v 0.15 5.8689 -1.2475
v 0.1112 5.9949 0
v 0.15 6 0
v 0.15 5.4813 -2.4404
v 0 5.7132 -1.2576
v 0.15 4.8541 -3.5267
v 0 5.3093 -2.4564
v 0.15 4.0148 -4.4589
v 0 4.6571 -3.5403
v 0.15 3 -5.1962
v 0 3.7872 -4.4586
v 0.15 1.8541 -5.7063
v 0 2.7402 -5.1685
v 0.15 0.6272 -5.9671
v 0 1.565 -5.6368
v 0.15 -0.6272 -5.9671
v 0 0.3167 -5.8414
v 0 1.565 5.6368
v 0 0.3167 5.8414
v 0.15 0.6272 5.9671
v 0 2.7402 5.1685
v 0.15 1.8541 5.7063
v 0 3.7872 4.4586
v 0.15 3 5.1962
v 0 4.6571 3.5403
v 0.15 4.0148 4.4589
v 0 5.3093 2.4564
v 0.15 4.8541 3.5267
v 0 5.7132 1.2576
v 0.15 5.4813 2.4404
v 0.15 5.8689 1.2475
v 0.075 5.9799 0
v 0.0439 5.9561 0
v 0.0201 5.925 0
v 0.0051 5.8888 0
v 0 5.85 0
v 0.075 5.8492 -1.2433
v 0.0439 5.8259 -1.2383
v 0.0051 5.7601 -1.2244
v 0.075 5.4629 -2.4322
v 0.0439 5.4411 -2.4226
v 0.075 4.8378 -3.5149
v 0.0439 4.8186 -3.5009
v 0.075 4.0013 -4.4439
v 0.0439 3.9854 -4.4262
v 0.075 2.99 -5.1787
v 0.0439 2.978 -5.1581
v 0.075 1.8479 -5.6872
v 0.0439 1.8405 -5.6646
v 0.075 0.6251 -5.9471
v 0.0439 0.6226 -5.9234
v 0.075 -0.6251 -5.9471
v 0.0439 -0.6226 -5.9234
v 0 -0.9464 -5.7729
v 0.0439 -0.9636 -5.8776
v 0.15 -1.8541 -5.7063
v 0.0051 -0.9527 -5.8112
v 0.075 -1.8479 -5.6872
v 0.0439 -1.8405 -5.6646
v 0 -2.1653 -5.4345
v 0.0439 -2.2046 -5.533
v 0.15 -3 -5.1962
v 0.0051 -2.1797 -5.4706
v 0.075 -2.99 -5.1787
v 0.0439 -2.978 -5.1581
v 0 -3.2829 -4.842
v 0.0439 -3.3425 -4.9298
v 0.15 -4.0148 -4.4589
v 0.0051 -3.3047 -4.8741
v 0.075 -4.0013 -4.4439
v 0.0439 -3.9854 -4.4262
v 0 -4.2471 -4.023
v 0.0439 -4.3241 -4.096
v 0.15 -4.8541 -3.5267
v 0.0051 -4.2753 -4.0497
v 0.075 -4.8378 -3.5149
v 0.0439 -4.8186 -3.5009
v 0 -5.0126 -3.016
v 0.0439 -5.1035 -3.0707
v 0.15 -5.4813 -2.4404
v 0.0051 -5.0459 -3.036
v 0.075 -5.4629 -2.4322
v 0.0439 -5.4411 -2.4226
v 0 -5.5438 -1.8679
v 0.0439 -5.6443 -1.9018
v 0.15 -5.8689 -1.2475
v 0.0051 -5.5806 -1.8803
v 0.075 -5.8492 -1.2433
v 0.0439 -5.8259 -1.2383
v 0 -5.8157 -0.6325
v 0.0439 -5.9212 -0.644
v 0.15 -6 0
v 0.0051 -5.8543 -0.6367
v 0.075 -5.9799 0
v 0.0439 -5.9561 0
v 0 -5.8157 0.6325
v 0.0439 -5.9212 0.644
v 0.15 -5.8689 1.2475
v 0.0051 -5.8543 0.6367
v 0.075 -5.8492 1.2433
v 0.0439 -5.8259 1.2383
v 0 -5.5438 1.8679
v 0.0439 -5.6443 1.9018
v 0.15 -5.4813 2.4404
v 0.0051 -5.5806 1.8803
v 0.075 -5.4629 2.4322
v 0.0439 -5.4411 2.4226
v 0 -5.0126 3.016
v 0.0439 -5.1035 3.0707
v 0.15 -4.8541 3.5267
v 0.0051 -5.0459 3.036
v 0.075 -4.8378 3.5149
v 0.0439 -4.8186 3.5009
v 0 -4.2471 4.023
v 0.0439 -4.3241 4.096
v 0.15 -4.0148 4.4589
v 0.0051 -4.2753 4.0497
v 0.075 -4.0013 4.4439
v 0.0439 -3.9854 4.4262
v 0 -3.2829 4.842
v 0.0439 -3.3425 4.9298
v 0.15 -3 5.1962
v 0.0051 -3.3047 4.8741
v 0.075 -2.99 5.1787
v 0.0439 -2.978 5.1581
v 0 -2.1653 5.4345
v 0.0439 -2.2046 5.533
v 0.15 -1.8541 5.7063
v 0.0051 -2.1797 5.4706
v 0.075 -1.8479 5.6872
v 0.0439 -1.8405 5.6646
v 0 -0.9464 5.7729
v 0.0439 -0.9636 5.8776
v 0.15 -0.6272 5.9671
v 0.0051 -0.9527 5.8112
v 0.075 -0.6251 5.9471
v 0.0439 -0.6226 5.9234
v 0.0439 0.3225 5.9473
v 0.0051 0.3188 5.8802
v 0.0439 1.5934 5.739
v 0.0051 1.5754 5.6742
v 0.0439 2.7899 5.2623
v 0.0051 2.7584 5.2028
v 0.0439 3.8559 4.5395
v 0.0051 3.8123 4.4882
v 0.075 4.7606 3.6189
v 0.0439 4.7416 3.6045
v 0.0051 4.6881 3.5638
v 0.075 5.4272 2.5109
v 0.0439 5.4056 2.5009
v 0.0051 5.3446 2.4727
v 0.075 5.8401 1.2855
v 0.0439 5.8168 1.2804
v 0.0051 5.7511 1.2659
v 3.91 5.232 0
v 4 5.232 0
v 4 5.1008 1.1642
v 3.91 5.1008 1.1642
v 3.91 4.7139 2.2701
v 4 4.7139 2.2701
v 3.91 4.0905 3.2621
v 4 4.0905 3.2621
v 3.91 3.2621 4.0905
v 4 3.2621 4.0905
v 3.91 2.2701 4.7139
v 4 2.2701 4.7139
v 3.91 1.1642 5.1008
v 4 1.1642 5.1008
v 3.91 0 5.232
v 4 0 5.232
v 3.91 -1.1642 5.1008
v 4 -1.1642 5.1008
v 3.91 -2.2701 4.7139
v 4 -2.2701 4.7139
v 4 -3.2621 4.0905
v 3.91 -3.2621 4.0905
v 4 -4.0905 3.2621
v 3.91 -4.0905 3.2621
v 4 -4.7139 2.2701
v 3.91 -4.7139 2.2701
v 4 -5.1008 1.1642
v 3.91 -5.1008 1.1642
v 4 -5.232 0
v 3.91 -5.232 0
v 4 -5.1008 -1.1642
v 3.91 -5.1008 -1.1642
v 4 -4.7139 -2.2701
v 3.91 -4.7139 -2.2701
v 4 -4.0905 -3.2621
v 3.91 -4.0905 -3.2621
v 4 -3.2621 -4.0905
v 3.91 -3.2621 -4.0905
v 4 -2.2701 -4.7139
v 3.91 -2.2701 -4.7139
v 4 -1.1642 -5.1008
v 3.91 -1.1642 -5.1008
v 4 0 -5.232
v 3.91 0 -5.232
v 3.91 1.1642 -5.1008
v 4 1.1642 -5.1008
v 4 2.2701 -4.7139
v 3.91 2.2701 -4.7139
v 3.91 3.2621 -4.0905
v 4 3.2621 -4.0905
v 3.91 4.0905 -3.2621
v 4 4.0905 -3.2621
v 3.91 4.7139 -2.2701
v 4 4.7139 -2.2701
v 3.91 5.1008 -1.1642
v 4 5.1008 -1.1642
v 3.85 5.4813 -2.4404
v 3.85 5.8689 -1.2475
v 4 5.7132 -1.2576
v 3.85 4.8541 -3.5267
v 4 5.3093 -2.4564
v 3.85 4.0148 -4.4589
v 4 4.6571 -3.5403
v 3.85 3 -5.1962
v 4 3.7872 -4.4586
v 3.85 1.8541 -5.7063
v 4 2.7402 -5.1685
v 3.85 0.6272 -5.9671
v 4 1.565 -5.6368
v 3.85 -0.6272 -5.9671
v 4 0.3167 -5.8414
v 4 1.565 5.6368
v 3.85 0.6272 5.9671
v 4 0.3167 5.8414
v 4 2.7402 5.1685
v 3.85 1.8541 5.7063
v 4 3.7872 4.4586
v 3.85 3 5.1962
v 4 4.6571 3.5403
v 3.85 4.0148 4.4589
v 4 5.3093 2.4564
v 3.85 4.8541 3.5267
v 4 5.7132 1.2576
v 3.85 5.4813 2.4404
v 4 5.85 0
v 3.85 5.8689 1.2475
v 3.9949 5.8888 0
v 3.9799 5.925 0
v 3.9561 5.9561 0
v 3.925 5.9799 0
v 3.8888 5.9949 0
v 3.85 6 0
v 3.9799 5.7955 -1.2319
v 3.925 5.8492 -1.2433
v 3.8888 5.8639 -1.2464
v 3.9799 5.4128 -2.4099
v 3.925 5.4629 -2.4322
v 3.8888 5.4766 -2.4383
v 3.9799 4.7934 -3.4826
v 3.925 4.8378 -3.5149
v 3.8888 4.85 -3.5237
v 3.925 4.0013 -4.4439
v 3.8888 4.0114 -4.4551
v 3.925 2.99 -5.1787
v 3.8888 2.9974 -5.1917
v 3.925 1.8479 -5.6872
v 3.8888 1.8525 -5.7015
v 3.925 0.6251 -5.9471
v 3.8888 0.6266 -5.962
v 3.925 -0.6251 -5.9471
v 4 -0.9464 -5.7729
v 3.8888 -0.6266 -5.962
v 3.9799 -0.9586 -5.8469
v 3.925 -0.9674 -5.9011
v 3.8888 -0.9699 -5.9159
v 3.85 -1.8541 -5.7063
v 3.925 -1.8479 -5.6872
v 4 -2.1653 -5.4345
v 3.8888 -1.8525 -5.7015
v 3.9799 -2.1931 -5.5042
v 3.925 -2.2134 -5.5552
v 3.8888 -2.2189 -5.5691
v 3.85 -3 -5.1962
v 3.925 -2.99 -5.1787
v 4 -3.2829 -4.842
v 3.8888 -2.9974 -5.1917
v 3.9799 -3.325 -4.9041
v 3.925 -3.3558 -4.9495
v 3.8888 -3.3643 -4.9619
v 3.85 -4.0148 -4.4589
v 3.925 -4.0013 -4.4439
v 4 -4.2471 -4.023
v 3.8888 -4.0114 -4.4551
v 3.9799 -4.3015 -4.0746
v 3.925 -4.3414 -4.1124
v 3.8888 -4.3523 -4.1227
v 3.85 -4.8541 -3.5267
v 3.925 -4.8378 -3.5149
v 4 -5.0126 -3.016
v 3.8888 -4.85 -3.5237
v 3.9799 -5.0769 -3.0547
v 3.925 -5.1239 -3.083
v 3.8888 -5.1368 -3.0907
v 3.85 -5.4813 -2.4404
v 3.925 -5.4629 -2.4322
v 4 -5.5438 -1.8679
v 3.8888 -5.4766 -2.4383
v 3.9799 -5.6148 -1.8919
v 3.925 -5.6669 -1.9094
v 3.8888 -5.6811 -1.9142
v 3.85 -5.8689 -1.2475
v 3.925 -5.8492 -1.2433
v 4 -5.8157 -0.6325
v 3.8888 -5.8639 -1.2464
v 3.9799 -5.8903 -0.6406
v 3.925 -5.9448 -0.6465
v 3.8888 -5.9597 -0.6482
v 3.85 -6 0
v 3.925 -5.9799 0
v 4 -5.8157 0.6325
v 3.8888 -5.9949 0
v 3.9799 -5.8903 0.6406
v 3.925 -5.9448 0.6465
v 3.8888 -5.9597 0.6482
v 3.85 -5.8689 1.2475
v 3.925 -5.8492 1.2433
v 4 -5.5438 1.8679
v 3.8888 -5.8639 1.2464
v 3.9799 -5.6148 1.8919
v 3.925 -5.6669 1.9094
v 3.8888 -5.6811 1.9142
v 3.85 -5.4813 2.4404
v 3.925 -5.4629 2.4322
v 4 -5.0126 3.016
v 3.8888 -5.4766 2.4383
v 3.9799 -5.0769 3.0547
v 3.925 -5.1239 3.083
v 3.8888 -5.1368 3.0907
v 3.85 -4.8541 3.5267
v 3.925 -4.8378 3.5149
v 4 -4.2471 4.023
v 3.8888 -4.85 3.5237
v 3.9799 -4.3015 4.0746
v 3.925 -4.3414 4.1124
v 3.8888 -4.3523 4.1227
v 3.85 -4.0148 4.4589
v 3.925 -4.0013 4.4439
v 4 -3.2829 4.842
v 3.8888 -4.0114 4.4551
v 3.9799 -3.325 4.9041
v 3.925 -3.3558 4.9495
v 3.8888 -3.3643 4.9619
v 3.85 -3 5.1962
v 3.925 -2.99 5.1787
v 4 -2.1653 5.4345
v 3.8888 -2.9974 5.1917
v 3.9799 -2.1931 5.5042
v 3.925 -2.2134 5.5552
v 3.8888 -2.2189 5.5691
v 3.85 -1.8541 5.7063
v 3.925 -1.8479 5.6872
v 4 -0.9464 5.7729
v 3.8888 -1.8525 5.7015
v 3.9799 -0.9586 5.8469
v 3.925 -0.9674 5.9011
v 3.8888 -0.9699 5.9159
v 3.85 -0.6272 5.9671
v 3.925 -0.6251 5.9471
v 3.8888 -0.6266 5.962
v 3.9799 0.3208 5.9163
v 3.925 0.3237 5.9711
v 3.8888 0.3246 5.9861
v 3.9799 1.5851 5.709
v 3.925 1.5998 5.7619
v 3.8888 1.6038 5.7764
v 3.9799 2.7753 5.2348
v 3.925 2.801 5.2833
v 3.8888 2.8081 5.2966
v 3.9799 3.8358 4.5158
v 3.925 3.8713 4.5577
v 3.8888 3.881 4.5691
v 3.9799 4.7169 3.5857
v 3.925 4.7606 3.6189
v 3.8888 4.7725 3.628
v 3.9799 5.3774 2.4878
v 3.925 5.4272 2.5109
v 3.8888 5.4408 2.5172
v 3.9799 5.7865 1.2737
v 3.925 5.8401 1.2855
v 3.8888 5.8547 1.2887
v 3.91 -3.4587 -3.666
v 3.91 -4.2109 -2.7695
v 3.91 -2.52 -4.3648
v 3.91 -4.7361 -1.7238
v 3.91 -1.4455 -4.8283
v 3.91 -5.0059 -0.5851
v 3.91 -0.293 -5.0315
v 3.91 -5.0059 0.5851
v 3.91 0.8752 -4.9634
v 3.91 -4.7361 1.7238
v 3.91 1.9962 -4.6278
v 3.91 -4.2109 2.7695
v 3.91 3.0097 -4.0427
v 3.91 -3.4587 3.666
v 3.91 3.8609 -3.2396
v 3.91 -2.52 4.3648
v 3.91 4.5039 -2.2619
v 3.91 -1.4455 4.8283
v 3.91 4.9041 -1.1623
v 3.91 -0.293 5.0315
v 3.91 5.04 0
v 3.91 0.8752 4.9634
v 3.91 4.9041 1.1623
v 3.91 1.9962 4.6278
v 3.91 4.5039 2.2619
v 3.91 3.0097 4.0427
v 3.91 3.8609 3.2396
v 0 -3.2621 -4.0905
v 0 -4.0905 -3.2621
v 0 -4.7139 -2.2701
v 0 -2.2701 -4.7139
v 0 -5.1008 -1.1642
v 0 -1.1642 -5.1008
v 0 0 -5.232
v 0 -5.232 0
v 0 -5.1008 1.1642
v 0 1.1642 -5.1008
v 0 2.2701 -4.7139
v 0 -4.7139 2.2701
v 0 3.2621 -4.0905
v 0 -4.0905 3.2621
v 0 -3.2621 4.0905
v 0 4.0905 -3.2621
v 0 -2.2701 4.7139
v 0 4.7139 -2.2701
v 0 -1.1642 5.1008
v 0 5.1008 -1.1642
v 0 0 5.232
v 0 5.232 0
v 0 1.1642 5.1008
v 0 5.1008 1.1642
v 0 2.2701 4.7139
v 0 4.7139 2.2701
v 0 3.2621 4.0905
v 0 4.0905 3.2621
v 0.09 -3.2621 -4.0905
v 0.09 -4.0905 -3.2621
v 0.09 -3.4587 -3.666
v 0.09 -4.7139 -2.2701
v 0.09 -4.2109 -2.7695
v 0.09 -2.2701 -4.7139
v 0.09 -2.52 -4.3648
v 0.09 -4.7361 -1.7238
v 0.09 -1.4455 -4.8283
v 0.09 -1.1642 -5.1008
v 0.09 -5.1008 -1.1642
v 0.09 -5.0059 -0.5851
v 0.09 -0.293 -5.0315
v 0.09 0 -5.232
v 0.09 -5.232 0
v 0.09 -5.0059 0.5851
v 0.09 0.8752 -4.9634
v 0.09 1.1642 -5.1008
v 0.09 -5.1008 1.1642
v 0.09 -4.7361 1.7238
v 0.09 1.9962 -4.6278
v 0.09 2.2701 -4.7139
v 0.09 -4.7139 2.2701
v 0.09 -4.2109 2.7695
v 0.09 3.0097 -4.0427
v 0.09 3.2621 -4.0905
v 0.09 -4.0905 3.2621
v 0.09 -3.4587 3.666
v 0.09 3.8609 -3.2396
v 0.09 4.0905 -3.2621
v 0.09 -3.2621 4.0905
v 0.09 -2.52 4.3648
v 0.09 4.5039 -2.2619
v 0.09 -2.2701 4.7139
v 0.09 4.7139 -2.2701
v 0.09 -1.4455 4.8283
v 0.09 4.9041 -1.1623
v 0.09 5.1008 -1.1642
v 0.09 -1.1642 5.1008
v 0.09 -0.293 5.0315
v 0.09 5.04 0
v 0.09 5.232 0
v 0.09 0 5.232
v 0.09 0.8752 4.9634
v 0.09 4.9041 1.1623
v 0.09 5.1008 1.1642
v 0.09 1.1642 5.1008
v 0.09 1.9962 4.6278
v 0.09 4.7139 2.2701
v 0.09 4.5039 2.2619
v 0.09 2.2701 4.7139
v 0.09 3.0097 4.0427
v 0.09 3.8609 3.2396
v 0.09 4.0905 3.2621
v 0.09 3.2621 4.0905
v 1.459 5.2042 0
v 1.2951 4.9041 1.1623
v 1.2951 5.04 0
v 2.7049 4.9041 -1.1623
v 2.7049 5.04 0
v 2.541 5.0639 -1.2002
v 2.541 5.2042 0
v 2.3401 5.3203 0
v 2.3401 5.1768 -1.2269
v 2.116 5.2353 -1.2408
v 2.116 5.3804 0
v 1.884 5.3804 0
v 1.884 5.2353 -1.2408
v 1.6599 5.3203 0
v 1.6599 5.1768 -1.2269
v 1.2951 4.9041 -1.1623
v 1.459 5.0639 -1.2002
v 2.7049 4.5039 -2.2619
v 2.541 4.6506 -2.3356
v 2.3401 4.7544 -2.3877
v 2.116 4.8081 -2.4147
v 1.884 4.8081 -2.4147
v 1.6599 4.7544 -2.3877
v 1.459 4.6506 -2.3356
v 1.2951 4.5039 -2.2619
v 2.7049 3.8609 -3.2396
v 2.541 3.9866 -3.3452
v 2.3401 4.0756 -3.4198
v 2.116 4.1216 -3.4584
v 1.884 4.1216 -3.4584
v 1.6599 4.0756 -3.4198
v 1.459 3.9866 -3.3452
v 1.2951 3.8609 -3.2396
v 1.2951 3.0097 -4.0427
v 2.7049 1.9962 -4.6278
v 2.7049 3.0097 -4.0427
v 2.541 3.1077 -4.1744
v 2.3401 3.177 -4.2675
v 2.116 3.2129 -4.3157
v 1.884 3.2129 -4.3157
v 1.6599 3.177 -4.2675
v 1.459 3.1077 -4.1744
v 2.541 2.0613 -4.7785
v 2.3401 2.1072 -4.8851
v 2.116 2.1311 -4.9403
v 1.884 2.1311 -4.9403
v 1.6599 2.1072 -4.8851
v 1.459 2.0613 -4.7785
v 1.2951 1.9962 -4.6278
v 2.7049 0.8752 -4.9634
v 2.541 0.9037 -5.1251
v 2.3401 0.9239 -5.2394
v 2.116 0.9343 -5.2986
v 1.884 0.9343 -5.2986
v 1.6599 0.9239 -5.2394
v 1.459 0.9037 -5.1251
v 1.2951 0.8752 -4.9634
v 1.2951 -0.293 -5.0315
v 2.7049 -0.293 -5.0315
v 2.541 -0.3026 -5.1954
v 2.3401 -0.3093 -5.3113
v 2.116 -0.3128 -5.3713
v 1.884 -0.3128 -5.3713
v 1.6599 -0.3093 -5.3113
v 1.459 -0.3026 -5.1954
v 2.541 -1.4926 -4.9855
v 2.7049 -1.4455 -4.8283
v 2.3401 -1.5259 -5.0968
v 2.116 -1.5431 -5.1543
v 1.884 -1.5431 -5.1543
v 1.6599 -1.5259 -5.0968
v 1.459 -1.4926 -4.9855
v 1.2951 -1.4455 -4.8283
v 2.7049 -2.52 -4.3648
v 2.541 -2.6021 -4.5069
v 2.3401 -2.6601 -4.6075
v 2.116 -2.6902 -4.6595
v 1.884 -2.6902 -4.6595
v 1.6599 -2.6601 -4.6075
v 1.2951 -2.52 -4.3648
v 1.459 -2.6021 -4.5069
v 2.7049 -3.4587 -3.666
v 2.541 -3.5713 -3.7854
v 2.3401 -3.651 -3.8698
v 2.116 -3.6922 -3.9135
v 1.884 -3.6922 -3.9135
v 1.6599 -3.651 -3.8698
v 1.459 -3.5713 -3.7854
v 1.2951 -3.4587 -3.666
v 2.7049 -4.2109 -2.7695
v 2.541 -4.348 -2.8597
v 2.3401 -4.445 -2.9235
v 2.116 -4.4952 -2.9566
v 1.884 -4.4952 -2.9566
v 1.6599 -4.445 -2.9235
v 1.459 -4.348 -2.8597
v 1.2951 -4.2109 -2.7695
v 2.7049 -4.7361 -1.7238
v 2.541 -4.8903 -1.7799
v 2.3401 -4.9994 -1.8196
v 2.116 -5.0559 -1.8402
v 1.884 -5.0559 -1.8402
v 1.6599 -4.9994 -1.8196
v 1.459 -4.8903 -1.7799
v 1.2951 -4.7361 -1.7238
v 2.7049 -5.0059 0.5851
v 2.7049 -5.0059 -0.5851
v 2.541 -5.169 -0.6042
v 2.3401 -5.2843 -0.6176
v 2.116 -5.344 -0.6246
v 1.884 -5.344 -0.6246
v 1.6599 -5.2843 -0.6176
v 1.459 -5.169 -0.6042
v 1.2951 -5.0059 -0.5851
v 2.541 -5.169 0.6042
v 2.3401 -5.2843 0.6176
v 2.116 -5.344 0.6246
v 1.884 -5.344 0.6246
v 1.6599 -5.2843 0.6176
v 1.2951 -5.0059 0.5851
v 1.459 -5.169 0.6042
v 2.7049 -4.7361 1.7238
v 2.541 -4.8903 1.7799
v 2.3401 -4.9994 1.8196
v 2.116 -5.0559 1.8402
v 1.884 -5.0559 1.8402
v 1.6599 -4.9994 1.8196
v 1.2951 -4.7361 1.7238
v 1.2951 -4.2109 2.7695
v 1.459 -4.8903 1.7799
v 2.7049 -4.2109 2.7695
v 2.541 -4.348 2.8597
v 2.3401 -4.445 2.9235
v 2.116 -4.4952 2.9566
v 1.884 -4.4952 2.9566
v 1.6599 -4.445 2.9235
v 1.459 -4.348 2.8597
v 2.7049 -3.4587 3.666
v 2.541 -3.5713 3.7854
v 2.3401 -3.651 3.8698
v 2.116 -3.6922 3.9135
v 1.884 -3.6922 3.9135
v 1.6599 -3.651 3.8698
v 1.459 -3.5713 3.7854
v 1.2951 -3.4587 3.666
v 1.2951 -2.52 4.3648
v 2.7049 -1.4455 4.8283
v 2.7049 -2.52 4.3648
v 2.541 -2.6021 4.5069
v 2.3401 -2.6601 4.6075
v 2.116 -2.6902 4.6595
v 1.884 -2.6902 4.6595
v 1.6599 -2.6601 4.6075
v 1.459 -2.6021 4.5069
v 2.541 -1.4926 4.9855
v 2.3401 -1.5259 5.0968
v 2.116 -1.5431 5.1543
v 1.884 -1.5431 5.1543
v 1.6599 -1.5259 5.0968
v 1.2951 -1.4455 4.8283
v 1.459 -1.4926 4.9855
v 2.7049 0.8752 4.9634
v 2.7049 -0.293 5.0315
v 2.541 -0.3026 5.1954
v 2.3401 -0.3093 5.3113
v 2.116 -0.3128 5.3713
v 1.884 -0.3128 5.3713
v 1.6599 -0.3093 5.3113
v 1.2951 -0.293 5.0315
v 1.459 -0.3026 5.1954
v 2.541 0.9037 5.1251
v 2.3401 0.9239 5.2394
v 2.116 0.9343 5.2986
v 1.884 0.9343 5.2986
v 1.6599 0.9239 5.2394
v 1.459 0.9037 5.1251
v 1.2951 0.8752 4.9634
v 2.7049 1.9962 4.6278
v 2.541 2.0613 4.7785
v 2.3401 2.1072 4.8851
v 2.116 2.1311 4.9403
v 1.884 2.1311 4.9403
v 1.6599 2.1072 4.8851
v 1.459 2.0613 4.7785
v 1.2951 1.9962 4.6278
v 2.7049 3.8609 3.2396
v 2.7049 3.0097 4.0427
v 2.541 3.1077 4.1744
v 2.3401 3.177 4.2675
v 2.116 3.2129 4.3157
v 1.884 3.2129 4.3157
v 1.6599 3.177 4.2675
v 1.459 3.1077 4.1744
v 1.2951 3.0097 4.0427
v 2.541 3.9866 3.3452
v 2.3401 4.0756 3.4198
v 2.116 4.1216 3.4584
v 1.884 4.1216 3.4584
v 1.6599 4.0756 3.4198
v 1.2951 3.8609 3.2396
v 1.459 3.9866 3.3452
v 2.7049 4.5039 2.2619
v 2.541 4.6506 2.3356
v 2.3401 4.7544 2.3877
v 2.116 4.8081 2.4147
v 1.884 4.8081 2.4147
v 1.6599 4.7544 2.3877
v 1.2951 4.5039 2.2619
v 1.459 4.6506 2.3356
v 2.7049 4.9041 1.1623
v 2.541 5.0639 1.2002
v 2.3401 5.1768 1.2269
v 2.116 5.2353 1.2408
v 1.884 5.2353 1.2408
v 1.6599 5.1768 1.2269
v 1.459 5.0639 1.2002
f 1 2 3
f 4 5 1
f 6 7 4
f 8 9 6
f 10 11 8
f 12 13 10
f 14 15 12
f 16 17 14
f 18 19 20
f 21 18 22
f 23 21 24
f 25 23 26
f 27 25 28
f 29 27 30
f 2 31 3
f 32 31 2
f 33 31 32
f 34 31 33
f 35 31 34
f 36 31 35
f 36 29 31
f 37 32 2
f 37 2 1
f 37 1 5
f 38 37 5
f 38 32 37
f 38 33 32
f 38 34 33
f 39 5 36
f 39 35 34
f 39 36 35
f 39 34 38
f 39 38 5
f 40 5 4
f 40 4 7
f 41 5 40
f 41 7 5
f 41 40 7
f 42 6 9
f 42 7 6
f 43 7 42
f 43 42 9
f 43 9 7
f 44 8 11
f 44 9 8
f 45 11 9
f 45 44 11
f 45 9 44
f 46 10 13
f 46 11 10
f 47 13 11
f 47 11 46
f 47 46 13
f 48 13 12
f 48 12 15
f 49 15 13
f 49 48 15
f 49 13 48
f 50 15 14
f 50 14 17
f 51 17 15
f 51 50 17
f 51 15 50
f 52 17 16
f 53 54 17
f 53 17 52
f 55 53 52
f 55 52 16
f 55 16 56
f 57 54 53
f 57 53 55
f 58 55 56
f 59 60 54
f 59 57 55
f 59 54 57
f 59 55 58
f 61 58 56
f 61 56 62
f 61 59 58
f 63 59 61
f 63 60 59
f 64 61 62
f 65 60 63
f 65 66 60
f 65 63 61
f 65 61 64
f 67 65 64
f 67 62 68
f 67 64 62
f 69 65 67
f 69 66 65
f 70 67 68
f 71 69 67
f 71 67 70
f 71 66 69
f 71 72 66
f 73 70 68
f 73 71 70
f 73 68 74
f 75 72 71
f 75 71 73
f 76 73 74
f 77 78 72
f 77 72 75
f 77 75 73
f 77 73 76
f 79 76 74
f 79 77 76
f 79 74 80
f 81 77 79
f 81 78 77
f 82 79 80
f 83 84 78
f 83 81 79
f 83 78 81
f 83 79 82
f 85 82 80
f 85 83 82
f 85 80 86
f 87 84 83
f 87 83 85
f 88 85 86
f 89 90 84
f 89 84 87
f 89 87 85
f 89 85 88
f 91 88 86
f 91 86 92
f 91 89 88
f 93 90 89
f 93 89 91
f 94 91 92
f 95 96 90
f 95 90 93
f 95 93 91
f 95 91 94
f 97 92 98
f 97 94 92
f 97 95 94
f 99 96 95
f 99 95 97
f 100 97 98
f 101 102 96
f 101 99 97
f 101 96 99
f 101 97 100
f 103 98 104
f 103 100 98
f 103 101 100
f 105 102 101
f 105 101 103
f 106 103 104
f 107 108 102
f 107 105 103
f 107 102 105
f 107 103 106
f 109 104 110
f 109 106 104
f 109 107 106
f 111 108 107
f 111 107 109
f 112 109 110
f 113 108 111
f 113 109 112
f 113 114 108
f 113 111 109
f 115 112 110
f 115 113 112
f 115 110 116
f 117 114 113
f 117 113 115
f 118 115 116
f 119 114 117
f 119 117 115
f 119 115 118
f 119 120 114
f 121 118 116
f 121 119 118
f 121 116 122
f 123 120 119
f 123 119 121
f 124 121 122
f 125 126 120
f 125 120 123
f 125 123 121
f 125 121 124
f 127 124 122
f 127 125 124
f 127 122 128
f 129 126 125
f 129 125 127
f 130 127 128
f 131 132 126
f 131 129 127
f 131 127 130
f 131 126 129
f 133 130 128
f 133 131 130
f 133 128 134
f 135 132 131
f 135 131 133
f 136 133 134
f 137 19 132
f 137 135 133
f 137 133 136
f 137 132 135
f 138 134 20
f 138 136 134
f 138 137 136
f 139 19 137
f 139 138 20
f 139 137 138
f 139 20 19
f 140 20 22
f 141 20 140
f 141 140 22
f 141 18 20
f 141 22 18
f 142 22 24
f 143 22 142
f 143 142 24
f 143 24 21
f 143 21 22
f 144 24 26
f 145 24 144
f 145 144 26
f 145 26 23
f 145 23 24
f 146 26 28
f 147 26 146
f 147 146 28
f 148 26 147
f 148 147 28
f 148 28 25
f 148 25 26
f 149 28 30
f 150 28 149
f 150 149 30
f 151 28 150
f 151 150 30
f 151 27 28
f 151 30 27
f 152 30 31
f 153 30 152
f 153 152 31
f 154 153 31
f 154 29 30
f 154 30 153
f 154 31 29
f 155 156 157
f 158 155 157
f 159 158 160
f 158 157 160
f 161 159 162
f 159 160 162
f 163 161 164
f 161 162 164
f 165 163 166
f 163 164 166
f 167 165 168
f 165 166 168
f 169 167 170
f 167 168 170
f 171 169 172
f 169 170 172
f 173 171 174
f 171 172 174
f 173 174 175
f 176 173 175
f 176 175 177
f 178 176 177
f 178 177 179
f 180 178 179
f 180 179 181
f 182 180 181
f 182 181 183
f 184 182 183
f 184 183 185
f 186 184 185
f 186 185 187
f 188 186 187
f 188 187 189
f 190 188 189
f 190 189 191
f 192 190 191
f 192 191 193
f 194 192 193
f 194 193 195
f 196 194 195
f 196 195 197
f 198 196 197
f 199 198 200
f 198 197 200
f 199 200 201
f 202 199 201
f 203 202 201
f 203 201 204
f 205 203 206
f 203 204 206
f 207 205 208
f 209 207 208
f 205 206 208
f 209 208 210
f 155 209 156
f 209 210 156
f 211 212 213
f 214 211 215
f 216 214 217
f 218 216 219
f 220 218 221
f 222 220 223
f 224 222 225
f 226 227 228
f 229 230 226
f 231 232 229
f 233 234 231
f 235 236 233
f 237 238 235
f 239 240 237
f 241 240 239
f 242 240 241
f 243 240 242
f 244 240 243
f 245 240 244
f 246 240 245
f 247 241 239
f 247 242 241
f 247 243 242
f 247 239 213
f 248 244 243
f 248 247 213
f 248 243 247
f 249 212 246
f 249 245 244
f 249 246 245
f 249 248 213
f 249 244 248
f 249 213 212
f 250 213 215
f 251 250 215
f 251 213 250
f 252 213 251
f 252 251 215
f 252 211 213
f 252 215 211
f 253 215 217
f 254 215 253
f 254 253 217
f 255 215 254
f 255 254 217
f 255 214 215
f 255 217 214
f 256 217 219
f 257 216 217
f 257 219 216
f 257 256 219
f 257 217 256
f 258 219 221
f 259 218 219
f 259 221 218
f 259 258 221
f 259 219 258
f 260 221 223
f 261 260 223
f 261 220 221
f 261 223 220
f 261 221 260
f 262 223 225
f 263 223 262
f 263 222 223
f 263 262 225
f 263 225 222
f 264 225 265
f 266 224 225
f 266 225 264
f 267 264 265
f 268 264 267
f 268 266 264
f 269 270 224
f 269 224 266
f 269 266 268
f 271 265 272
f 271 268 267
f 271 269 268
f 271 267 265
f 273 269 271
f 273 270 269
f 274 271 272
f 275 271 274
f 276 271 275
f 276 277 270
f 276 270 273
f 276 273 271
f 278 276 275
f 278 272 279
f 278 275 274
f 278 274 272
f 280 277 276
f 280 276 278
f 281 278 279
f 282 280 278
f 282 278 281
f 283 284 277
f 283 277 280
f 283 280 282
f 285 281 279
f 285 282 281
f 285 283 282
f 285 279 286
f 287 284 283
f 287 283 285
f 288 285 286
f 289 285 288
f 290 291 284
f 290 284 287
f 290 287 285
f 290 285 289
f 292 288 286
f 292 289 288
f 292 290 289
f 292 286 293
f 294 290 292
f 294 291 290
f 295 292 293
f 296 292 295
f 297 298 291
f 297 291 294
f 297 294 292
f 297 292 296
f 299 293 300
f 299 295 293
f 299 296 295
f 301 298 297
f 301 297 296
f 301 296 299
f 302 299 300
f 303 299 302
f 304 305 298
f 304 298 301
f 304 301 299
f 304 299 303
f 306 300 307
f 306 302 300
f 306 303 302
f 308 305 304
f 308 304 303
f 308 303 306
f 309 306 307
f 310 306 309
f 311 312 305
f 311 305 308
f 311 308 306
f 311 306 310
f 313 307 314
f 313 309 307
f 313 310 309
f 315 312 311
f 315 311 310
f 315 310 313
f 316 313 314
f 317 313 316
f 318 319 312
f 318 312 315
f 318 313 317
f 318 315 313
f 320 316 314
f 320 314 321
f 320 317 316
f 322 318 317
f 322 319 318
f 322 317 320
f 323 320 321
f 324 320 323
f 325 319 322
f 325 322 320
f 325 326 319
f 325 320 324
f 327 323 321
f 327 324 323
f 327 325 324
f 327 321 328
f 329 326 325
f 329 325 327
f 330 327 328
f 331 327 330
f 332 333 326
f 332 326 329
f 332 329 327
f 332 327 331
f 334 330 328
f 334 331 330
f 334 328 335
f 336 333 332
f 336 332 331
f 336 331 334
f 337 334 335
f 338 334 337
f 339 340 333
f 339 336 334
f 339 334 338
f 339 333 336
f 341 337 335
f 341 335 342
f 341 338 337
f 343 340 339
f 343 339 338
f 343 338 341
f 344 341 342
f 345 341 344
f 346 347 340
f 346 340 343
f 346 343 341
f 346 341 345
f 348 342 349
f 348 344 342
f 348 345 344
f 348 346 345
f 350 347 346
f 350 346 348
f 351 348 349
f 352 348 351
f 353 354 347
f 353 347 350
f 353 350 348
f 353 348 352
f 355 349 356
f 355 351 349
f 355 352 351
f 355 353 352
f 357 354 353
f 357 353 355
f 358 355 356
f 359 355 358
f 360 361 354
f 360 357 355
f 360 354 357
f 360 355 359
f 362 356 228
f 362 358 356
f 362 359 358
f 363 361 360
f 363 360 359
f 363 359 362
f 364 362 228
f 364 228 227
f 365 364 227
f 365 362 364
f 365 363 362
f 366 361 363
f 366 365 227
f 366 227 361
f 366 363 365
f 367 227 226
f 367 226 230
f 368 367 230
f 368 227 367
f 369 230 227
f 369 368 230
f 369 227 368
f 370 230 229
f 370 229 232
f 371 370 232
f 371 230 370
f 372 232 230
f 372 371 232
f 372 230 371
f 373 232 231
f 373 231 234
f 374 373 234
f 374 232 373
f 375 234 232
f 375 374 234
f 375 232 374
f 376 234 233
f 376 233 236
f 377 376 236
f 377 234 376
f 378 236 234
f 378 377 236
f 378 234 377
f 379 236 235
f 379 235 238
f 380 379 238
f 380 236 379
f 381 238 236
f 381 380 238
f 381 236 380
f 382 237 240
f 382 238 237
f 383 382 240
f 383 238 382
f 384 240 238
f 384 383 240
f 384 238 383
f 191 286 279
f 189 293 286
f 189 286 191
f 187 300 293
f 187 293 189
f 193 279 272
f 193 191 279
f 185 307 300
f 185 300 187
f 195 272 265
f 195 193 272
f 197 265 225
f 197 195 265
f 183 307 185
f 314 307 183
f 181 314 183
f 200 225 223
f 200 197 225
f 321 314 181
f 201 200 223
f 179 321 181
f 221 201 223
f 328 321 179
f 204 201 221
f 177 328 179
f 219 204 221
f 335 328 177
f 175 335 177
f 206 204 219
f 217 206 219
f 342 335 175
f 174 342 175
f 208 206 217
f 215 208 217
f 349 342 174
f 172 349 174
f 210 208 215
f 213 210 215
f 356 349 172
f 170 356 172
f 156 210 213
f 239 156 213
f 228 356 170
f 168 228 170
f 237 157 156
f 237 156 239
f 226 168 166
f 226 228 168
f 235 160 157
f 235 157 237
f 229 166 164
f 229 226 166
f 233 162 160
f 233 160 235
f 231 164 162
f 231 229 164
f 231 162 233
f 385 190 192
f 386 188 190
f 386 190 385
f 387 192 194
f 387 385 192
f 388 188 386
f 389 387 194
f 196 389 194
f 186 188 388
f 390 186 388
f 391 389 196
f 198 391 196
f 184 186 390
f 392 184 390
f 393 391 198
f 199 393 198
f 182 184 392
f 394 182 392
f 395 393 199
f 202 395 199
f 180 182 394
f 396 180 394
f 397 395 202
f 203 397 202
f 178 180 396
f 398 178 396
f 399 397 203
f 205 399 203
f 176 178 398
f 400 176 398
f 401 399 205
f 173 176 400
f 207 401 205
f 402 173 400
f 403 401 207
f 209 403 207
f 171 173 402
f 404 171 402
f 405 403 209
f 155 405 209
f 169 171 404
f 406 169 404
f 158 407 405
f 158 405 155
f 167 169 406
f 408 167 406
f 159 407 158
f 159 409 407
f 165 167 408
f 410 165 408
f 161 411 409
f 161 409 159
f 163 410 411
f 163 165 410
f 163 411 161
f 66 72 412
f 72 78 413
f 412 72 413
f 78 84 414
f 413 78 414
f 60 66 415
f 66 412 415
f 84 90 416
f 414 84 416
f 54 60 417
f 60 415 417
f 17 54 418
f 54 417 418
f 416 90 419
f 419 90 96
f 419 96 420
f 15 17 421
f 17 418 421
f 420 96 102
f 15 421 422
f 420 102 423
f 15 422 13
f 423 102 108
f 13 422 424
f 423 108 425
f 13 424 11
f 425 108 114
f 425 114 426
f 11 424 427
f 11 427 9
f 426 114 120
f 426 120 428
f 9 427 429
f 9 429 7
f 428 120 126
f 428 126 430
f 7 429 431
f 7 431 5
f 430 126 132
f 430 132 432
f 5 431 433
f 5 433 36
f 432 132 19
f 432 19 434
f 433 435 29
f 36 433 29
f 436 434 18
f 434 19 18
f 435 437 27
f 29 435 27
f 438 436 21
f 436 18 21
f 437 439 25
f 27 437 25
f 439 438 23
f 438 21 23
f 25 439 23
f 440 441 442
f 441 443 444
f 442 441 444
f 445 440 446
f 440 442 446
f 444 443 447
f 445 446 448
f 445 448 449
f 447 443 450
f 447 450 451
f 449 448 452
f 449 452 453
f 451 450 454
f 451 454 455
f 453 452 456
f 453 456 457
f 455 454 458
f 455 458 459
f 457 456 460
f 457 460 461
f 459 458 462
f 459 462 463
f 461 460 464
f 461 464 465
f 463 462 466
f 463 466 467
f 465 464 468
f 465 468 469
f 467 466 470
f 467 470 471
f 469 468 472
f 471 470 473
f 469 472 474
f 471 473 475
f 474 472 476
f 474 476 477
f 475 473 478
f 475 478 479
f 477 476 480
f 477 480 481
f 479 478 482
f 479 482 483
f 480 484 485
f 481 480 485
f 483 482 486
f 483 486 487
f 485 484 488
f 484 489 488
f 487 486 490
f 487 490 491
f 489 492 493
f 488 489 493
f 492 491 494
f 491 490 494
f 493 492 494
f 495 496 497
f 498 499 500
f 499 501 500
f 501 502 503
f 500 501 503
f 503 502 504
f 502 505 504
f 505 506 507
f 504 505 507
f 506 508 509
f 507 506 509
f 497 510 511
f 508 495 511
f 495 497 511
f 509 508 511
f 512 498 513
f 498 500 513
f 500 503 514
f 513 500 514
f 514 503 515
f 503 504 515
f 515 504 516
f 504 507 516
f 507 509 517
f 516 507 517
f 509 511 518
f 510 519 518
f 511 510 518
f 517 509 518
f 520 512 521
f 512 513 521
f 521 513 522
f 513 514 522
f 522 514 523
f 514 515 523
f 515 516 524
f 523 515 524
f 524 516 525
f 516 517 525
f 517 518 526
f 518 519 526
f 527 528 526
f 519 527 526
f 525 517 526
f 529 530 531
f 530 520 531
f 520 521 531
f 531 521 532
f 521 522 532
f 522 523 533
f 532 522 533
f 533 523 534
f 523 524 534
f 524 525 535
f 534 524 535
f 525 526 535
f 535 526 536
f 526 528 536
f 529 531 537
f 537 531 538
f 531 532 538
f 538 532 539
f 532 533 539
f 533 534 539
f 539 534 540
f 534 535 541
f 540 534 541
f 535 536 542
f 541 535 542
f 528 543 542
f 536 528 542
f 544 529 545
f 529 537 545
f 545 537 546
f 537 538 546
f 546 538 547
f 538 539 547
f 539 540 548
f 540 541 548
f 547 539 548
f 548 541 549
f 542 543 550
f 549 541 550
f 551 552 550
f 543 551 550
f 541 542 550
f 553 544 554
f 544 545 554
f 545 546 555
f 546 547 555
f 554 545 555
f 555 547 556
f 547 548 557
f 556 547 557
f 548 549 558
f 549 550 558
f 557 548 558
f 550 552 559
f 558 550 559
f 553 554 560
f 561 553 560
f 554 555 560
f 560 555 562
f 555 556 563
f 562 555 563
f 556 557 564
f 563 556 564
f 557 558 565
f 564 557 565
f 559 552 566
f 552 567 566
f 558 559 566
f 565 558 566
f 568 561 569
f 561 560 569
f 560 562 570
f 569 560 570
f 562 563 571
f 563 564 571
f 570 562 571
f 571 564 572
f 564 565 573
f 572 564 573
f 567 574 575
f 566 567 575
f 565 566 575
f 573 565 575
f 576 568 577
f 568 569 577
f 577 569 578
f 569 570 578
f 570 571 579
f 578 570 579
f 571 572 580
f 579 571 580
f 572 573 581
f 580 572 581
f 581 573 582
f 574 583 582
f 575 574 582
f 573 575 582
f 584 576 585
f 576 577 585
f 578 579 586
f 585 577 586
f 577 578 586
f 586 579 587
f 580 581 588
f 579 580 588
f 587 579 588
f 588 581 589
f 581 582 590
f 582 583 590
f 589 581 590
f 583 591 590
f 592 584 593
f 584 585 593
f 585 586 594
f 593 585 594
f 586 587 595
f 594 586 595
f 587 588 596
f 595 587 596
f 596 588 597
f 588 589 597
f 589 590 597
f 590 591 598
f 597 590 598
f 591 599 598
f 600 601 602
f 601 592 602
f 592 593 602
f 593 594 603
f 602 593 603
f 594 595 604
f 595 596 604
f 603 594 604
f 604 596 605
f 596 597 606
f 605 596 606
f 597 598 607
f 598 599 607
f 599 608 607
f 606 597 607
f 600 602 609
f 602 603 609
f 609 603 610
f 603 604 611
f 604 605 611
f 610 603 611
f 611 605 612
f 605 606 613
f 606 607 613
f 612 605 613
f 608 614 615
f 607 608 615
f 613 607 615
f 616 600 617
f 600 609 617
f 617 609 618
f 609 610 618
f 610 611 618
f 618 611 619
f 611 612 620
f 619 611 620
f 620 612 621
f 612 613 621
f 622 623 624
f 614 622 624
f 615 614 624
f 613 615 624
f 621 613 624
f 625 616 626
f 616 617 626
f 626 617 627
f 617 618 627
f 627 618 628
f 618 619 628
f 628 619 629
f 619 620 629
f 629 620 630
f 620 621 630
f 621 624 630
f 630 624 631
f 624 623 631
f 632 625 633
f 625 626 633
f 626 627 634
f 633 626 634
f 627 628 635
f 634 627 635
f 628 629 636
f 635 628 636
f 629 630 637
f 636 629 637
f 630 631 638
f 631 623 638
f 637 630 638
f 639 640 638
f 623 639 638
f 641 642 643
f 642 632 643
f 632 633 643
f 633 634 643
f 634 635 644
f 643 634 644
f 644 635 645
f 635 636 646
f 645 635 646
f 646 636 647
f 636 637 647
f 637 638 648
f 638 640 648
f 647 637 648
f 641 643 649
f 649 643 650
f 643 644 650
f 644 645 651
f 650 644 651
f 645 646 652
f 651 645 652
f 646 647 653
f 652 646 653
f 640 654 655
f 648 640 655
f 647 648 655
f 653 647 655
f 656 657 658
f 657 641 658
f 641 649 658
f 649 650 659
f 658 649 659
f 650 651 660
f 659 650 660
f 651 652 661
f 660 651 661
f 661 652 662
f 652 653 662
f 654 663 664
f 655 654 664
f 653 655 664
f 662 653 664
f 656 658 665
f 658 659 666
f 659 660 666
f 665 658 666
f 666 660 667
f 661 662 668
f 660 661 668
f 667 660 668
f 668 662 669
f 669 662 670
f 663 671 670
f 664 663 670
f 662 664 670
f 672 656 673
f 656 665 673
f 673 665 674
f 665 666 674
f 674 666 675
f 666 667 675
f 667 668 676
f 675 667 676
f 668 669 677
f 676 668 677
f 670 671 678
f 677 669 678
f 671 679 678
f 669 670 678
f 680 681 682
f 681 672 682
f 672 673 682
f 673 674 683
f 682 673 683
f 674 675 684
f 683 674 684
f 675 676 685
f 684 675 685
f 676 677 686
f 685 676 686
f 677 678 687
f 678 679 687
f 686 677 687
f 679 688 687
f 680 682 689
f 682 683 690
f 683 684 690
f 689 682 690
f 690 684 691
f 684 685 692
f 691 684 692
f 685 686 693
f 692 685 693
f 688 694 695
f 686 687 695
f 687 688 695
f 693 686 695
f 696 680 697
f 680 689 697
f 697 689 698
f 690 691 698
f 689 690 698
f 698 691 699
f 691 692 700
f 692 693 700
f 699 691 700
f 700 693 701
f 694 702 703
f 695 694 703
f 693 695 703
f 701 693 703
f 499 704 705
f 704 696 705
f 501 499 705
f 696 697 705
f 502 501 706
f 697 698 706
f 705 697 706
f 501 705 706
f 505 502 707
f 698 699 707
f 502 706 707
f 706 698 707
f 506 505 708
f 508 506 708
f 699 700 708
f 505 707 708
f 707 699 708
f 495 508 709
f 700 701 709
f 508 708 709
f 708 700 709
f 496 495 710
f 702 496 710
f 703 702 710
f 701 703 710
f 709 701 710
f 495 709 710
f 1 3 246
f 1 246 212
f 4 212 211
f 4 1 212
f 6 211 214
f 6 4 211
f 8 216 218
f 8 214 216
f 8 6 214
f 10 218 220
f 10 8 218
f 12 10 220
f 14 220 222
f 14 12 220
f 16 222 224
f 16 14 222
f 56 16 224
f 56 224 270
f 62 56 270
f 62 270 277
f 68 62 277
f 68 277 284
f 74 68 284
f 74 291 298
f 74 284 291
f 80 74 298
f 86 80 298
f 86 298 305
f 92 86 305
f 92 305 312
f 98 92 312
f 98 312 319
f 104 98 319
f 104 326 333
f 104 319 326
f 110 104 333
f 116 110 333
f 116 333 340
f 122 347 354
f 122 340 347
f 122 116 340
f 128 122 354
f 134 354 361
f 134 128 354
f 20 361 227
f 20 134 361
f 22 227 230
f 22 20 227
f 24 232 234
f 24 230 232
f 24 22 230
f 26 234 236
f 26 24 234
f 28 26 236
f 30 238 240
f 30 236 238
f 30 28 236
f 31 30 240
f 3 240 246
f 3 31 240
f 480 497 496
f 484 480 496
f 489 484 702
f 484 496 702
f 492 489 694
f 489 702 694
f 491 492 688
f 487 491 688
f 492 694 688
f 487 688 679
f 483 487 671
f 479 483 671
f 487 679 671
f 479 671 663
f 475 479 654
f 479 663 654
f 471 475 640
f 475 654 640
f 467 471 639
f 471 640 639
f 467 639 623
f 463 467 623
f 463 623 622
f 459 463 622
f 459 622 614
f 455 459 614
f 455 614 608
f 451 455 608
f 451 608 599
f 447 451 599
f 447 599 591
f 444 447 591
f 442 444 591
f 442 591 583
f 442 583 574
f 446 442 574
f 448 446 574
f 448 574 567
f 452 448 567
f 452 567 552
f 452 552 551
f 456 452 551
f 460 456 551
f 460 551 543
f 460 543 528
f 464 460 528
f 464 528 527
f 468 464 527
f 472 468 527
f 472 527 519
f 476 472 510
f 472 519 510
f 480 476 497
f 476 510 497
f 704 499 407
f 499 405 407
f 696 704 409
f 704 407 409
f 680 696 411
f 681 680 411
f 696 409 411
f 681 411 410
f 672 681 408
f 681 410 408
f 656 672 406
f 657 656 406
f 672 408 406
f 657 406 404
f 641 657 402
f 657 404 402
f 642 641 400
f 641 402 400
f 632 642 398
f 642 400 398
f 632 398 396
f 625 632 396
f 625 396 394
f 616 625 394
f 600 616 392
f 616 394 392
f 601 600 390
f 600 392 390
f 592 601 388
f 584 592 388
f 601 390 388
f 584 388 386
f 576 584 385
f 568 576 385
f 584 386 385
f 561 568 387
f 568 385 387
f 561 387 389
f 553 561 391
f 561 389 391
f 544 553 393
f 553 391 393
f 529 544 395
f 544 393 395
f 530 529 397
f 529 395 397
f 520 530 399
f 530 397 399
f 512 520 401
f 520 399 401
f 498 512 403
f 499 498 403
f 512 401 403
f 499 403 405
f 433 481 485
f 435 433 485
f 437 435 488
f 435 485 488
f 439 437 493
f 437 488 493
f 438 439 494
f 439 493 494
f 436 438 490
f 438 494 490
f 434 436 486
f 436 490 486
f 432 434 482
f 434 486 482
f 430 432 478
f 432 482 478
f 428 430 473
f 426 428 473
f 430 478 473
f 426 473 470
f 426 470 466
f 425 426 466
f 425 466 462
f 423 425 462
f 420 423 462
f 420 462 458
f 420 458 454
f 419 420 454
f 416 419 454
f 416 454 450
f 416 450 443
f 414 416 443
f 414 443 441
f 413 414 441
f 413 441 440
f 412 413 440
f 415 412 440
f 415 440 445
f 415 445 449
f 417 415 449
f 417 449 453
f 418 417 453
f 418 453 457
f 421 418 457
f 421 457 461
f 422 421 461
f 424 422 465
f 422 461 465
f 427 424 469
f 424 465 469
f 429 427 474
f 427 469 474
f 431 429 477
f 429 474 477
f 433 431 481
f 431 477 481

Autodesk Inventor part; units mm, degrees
sketch "Sketch_3" plane through (0, 0, 0) normal (0, 0, 1) x (1, 0, 0)
  line L0 (4, 0) -> (0, 0)
  line L1 (0, 5.232) -> (0.09, 5.232)
  line L2 (0.09, 5.232) -> (0.09, 5.04)
  line L3 (0.09, 5.04) -> (1.2951, 5.04)
  arc A0 (2.7049, 5.04) -> (1.2951, 5.04) centre (2, 4.5) ccw
  line L4 (2.7049, 5.04) -> (3.91, 5.04)
  line L5 (3.91, 5.04) -> (3.91, 5.232)
  line L6 (3.91, 5.232) -> (4, 5.232)
  line L7 (4, 5.232) -> (4, 5.85)
  arc A1 (4, 5.85) -> (3.85, 6) centre (3.85, 5.85) ccw
  line L8 (3.85, 6) -> (0.15, 6)
  arc A2 (0.15, 6) -> (0, 5.85) centre (0.15, 5.85) ccw
  line L9 (0, 5.85) -> (0, 5.232)
revolve "Revolution1" add sketch "Sketch_3" angle 360 about axis through (4, 0, 0) along (1, 0, 0)
ref_plane "mss_or_XY" through (0, 0, 0) normal (1, 0, 0) x (0, 0, -1)
ref_plane "mss_or_YZ" through (0, 0, 0) normal (0, 0, -1) x (0, 1, 0)
ref_plane "mss_or_ZX" through (0, 0, 0) normal (0, 1, 0) x (1, 0, 0)
ref_plane "mss_or11_XY" through (4, 0, 0) normal (1, 0, 0) x (0, 0, -1)
ref_plane "mss_or11_YZ" through (4, 0, 0) normal (0, 0, -1) x (0, 1, 0)
ref_plane "mss_or11_ZX" through (4, 0, 0) normal (0, 1, 0) x (1, 0, 0)
ref_plane "mss_or2_1_XY" through (1.5, 4.5, 0) normal (1, 0, 0) x (0, 0, -1)
ref_plane "mss_or2_1_YZ" through (1.5, 4.5, 0) normal (0, 0, -1) x (0, 1, 0)
ref_plane "mss_or2_1_ZX" through (1.5, 4.5, 0) normal (0, 1, 0) x (1, 0, 0)
ref_plane "mss_or2_2_XY" through (1.5, 3.4472, 2.8925) normal (1, 0, 0) x (0, 0, -1)
ref_plane "mss_or2_2_YZ" through (1.5, 3.4472, 2.8925) normal (0, 0, -1) x (0, 1, 0)
ref_plane "mss_or2_2_ZX" through (1.5, 3.4472, 2.8925) normal (0, 1, 0) x (1, 0, 0)
ref_plane "mss_or2_3_XY" through (1.5, 0.7814, 4.4316) normal (1, 0, 0) x (0, 0, -1)
ref_plane "mss_or2_3_YZ" through (1.5, 0.7814, 4.4316) normal (0, 0, -1) x (0, 1, 0)
ref_plane "mss_or2_3_ZX" through (1.5, 0.7814, 4.4316) normal (0, 1, 0) x (1, 0, 0)
ref_plane "mss_or2_4_XY" through (1.5, -2.25, 3.8971) normal (1, 0, 0) x (0, 0, -1)
ref_plane "mss_or2_4_YZ" through (1.5, -2.25, 3.8971) normal (0, 0, -1) x (0, 1, 0)
ref_plane "mss_or2_4_ZX" through (1.5, -2.25, 3.8971) normal (0, 1, 0) x (1, 0, 0)
ref_plane "mss_or2_5_XY" through (1.5, -4.2286, 1.5391) normal (1, 0, 0) x (0, 0, -1)
ref_plane "mss_or2_5_YZ" through (1.5, -4.2286, 1.5391) normal (0, 0, -1) x (0, 1, 0)
ref_plane "mss_or2_5_ZX" through (1.5, -4.2286, 1.5391) normal (0, 1, 0) x (1, 0, 0)
ref_plane "mss_or2_6_XY" through (1.5, -4.2286, -1.5391) normal (1, 0, 0) x (0, 0, -1)
ref_plane "mss_or2_6_YZ" through (1.5, -4.2286, -1.5391) normal (0, 0, -1) x (0, 1, 0)
ref_plane "mss_or2_6_ZX" through (1.5, -4.2286, -1.5391) normal (0, 1, 0) x (1, 0, 0)
ref_plane "mss_or2_7_XY" through (1.5, -2.25, -3.8971) normal (1, 0, 0) x (0, 0, -1)
ref_plane "mss_or2_7_YZ" through (1.5, -2.25, -3.8971) normal (0, 0, -1) x (0, 1, 0)
ref_plane "mss_or2_7_ZX" through (1.5, -2.25, -3.8971) normal (0, 1, 0) x (1, 0, 0)
ref_plane "mss_or2_8_XY" through (1.5, 0.7814, -4.4316) normal (1, 0, 0) x (0, 0, -1)
ref_plane "mss_or2_8_YZ" through (1.5, 0.7814, -4.4316) normal (0, 0, -1) x (0, 1, 0)
ref_plane "mss_or2_8_ZX" through (1.5, 0.7814, -4.4316) normal (0, 1, 0) x (1, 0, 0)
ref_plane "mss_or2_9_XY" through (1.5, 3.4472, -2.8925) normal (1, 0, 0) x (0, 0, -1)
ref_plane "mss_or2_9_YZ" through (1.5, 3.4472, -2.8925) normal (0, 0, -1) x (0, 1, 0)
ref_plane "mss_or2_9_ZX" through (1.5, 3.4472, -2.8925) normal (0, 1, 0) x (1, 0, 0)
ref_plane "mss_or21_1_XY" through (2, 4.5, 0) normal (1, 0, 0) x (0, 0, -1)
ref_plane "mss_or21_1_YZ" through (2, 4.5, 0) normal (0, 0, -1) x (0, 1, 0)
ref_plane "mss_or21_1_ZX" through (2, 4.5, 0) normal (0, 1, 0) x (1, 0, 0)
ref_plane "mss_or21_2_XY" through (2, 3.4472, 2.8925) normal (1, 0, 0) x (0, 0, -1)
ref_plane "mss_or21_2_YZ" through (2, 3.4472, 2.8925) normal (0, 0, -1) x (0, 1, 0)
ref_plane "mss_or21_2_ZX" through (2, 3.4472, 2.8925) normal (0, 1, 0) x (1, 0, 0)
ref_plane "mss_or21_3_XY" through (2, 0.7814, 4.4316) normal (1, 0, 0) x (0, 0, -1)
ref_plane "mss_or21_3_YZ" through (2, 0.7814, 4.4316) normal (0, 0, -1) x (0, 1, 0)
ref_plane "mss_or21_3_ZX" through (2, 0.7814, 4.4316) normal (0, 1, 0) x (1, 0, 0)
ref_plane "mss_or21_4_XY" through (2, -2.25, 3.8971) normal (1, 0, 0) x (0, 0, -1)
ref_plane "mss_or21_4_YZ" through (2, -2.25, 3.8971) normal (0, 0, -1) x (0, 1, 0)
ref_plane "mss_or21_4_ZX" through (2, -2.25, 3.8971) normal (0, 1, 0) x (1, 0, 0)
ref_plane "mss_or21_5_XY" through (2, -4.2286, 1.5391) normal (1, 0, 0) x (0, 0, -1)
ref_plane "mss_or21_5_YZ" through (2, -4.2286, 1.5391) normal (0, 0, -1) x (0, 1, 0)
ref_plane "mss_or21_5_ZX" through (2, -4.2286, 1.5391) normal (0, 1, 0) x (1, 0, 0)
ref_plane "mss_or21_6_XY" through (2, -4.2286, -1.5391) normal (1, 0, 0) x (0, 0, -1)
ref_plane "mss_or21_6_YZ" through (2, -4.2286, -1.5391) normal (0, 0, -1) x (0, 1, 0)
ref_plane "mss_or21_6_ZX" through (2, -4.2286, -1.5391) normal (0, 1, 0) x (1, 0, 0)
ref_plane "mss_or21_7_XY" through (2, -2.25, -3.8971) normal (1, 0, 0) x (0, 0, -1)
ref_plane "mss_or21_7_YZ" through (2, -2.25, -3.8971) normal (0, 0, -1) x (0, 1, 0)
ref_plane "mss_or21_7_ZX" through (2, -2.25, -3.8971) normal (0, 1, 0) x (1, 0, 0)
ref_plane "mss_or21_8_XY" through (2, 0.7814, -4.4316) normal (1, 0, 0) x (0, 0, -1)
ref_plane "mss_or21_8_YZ" through (2, 0.7814, -4.4316) normal (0, 0, -1) x (0, 1, 0)
ref_plane "mss_or21_8_ZX" through (2, 0.7814, -4.4316) normal (0, 1, 0) x (1, 0, 0)
ref_plane "mss_or21_9_XY" through (2, 3.4472, -2.8925) normal (1, 0, 0) x (0, 0, -1)
ref_plane "mss_or21_9_YZ" through (2, 3.4472, -2.8925) normal (0, 0, -1) x (0, 1, 0)
ref_plane "mss_or21_9_ZX" through (2, 3.4472, -2.8925) normal (0, 1, 0) x (1, 0, 0)
properties part number "WBC6-12ZZ Outer ring"
